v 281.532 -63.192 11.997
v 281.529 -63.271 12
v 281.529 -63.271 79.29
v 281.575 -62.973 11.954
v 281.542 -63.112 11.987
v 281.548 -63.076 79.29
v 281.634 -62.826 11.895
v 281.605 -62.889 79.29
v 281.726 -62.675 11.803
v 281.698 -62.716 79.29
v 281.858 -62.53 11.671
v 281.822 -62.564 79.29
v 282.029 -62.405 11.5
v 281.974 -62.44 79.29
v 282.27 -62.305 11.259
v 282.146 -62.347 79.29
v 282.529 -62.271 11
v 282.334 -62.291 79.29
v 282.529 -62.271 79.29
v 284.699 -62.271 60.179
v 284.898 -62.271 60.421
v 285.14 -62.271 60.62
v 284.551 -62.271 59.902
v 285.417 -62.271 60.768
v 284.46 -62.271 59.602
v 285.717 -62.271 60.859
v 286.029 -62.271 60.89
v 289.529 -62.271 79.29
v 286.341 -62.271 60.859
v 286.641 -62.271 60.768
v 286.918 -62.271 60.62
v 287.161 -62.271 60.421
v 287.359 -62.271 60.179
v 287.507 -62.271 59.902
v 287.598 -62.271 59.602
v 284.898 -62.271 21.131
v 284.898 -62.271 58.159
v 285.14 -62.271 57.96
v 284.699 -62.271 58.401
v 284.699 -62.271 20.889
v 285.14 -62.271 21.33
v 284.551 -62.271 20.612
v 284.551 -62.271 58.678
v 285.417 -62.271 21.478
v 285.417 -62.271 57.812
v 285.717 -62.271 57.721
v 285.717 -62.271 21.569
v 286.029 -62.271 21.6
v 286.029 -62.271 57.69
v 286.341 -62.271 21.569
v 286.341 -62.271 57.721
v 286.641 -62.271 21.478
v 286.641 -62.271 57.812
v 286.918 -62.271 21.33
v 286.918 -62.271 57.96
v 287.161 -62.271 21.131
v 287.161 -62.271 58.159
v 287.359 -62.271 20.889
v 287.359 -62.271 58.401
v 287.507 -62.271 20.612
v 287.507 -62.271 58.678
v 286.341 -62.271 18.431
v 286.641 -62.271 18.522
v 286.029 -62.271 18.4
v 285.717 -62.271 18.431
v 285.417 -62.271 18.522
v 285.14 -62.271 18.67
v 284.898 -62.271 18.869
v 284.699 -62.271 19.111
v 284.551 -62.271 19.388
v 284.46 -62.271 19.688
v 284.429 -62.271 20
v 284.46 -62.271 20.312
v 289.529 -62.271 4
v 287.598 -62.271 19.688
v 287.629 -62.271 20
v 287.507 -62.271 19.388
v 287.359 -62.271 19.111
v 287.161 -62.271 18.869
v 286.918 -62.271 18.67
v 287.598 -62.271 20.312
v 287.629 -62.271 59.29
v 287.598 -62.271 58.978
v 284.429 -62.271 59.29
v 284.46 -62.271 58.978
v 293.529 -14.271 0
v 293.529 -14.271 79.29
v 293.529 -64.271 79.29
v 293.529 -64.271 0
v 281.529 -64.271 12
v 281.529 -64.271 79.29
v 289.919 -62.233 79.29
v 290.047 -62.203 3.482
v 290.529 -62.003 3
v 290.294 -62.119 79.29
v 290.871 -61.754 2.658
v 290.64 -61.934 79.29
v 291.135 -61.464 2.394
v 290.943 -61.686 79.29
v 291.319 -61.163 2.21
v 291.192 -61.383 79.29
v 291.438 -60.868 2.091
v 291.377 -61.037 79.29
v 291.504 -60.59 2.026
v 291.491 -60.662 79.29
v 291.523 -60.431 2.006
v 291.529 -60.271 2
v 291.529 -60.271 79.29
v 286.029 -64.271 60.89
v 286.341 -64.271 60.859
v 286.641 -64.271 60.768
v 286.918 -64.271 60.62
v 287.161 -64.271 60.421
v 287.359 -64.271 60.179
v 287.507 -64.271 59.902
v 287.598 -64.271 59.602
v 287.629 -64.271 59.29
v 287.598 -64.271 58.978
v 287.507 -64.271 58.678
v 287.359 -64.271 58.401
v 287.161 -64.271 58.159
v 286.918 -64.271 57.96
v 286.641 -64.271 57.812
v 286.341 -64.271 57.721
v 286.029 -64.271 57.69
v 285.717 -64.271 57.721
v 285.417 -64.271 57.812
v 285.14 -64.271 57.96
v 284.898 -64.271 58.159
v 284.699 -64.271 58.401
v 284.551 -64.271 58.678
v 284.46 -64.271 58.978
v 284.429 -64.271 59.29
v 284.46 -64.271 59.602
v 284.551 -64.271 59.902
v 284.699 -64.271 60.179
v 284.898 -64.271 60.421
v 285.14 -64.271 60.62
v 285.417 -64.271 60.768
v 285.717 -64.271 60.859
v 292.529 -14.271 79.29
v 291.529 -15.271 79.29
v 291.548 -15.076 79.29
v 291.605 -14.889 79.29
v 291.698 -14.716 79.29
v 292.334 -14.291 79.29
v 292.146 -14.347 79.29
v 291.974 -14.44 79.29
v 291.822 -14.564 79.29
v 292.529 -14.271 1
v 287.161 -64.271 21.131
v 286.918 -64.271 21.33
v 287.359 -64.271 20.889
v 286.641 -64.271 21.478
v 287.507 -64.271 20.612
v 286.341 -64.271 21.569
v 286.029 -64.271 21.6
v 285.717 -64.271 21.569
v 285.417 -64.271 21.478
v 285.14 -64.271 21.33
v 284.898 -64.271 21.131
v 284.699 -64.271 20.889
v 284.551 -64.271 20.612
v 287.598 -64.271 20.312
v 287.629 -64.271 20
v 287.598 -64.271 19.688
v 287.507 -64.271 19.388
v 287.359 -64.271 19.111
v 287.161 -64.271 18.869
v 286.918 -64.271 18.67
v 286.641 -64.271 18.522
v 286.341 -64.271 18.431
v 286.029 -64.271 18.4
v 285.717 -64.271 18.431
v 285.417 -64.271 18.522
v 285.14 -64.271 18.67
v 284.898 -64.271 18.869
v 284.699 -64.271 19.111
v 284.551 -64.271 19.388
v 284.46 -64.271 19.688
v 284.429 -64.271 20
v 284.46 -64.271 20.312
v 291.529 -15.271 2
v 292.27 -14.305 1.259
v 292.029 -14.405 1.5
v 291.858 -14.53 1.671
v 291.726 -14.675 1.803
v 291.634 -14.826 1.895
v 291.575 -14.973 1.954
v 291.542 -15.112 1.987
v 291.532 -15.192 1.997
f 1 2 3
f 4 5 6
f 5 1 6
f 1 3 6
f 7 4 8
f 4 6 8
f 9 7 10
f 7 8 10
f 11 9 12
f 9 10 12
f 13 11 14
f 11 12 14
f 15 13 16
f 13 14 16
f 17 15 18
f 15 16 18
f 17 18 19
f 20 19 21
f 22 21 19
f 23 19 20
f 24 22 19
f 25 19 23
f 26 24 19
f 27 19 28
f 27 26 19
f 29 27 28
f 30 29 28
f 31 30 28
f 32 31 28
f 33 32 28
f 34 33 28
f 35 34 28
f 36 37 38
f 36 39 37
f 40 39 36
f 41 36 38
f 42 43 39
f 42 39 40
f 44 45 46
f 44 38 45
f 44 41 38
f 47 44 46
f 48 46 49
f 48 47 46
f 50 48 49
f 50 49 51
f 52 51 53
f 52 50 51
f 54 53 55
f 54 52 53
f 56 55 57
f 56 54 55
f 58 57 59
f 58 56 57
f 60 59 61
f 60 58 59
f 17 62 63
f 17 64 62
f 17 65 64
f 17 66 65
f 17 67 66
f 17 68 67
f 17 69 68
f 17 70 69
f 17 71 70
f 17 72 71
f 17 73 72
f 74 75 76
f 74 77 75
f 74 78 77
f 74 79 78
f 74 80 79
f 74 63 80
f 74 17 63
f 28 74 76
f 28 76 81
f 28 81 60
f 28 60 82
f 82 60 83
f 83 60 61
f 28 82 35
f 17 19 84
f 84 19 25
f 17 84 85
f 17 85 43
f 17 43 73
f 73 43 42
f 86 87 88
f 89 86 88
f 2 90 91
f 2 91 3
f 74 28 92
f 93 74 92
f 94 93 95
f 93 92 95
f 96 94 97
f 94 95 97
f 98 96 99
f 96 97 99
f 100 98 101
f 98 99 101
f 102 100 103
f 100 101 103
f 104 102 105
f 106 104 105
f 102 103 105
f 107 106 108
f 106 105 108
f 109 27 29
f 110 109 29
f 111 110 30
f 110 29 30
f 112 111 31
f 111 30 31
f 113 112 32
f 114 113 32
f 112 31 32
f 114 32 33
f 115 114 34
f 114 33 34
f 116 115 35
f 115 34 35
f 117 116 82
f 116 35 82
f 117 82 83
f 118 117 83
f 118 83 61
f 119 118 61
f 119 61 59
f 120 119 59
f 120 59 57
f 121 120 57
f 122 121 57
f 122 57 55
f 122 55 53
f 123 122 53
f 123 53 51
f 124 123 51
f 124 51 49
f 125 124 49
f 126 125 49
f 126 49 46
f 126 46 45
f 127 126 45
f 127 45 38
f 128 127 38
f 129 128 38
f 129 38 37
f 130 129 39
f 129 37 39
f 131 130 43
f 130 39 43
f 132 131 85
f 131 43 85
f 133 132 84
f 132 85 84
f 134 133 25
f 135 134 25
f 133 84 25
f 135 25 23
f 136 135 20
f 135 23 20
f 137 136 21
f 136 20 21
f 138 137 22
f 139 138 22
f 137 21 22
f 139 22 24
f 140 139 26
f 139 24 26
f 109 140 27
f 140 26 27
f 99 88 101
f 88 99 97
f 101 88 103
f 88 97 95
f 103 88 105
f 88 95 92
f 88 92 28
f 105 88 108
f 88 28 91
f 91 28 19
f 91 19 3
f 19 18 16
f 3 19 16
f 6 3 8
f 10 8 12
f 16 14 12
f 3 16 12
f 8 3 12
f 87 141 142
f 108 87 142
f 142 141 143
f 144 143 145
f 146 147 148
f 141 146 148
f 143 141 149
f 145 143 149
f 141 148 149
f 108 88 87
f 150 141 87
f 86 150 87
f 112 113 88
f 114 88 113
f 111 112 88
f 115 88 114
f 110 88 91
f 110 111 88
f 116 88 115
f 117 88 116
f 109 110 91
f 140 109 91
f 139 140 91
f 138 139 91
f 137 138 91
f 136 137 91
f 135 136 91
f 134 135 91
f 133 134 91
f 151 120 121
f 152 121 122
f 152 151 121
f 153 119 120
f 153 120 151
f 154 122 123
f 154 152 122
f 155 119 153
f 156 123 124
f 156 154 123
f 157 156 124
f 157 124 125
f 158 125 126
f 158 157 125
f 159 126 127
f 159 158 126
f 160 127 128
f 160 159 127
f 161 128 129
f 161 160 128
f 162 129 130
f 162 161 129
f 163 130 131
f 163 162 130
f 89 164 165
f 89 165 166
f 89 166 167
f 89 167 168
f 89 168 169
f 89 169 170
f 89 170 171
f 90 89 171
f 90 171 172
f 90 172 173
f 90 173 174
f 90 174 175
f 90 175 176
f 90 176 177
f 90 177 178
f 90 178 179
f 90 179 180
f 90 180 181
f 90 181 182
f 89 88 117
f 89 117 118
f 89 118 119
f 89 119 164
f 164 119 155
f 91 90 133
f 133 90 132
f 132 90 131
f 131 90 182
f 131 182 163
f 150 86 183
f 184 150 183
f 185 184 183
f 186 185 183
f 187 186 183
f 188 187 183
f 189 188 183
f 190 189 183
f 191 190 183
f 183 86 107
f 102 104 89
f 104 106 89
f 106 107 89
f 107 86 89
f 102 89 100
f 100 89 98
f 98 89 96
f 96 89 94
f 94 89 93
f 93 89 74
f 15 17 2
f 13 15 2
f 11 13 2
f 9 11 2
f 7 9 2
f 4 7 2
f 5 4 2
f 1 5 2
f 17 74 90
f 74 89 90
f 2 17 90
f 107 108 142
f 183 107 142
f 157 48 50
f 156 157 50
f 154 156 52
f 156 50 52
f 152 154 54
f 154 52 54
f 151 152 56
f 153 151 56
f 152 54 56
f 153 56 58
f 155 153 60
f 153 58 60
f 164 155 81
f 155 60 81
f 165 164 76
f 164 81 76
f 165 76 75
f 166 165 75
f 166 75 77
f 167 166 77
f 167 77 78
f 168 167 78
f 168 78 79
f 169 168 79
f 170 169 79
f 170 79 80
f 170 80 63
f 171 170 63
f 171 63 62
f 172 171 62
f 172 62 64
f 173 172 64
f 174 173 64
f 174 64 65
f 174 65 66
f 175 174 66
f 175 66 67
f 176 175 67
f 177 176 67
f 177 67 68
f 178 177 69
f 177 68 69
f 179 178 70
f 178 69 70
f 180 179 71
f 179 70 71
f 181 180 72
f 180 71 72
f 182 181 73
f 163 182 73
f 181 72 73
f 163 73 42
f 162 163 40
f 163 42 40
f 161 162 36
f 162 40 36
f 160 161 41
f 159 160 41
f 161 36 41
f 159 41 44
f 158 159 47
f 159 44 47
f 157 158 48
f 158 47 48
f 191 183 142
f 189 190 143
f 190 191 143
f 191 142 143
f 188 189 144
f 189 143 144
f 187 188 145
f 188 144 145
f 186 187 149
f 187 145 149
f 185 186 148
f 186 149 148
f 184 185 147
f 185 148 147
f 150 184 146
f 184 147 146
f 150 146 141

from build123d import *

# Parameters (mm, degrees)
BOSS_EXTRUDE1_DEPTH     = 79.29
FILLET1_R               = 1
FILLET2_R               = 2
SKETCH2_R               = 1.6
CUT_EXTRUDE1_DEPTH      = 308.8152925
CUT_EXTRUDE4_DEPTH      = 308.8152925
CUT_EXTRUDE4_DEPTH_BACK = 308.8152925


with BuildPart() as part:
    # Sketch1 → Boss-Extrude1 (new body)
    with BuildSketch(Plane.XY):
        Polygon((293.529130065, -14.271367807), (293.529130065, -64.271367807), (281.529130065, -64.271367807), (281.529130065, -62.271367807), (291.529130065, -62.271367807), (291.529130065, -14.271367807), align=None)
    extrude(amount=BOSS_EXTRUDE1_DEPTH)

    # Fillet1
    fillet1_edges = [part.edges().sort_by_distance(p)[0] for p in [
        (281.529130065, -62.271367807, 39.645),
        (291.529130065, -14.271367807, 39.645),
    ]]
    fillet(fillet1_edges, radius=FILLET1_R)

    # Fillet2
    fillet2_edges = [part.edges().sort_by_distance(p)[0] for p in [
        (291.529130065, -62.271367807, 39.645),
    ]]
    fillet(fillet2_edges, radius=FILLET2_R)

    # Sketch2 → Cut-Extrude1 (cut, through all)
    with BuildSketch(Plane(origin=(0, -62.271367807, 0), x_dir=(1, 0, 0), z_dir=(0, 1, 0))):
        with Locations(Location((286.029130065, -20, 0), (0, 0, 270))):
            Circle(SKETCH2_R)
        with Locations(Location((286.029130065, -59.29, 0), (0, 0, 270))):
            Circle(SKETCH2_R)
    extrude(amount=-CUT_EXTRUDE1_DEPTH, mode=Mode.SUBTRACT)

    # Sketch3 → Cut-Extrude4 (cut, two sides: drawn at the far end of the back side and taken through both)
    with BuildSketch(Plane(origin=(0, -62.271367807, 0), x_dir=(1, 0, 0), z_dir=(0, 1, 0)).offset(-CUT_EXTRUDE4_DEPTH_BACK)):
        Polygon((293.529130065, 0), (281.33161049, -12.197519575), (281.33161049, 1.118185929), (293.529130065, 1.118185929), align=None)
    extrude(amount=CUT_EXTRUDE4_DEPTH + CUT_EXTRUDE4_DEPTH_BACK, mode=Mode.SUBTRACT)


solid = part.part
